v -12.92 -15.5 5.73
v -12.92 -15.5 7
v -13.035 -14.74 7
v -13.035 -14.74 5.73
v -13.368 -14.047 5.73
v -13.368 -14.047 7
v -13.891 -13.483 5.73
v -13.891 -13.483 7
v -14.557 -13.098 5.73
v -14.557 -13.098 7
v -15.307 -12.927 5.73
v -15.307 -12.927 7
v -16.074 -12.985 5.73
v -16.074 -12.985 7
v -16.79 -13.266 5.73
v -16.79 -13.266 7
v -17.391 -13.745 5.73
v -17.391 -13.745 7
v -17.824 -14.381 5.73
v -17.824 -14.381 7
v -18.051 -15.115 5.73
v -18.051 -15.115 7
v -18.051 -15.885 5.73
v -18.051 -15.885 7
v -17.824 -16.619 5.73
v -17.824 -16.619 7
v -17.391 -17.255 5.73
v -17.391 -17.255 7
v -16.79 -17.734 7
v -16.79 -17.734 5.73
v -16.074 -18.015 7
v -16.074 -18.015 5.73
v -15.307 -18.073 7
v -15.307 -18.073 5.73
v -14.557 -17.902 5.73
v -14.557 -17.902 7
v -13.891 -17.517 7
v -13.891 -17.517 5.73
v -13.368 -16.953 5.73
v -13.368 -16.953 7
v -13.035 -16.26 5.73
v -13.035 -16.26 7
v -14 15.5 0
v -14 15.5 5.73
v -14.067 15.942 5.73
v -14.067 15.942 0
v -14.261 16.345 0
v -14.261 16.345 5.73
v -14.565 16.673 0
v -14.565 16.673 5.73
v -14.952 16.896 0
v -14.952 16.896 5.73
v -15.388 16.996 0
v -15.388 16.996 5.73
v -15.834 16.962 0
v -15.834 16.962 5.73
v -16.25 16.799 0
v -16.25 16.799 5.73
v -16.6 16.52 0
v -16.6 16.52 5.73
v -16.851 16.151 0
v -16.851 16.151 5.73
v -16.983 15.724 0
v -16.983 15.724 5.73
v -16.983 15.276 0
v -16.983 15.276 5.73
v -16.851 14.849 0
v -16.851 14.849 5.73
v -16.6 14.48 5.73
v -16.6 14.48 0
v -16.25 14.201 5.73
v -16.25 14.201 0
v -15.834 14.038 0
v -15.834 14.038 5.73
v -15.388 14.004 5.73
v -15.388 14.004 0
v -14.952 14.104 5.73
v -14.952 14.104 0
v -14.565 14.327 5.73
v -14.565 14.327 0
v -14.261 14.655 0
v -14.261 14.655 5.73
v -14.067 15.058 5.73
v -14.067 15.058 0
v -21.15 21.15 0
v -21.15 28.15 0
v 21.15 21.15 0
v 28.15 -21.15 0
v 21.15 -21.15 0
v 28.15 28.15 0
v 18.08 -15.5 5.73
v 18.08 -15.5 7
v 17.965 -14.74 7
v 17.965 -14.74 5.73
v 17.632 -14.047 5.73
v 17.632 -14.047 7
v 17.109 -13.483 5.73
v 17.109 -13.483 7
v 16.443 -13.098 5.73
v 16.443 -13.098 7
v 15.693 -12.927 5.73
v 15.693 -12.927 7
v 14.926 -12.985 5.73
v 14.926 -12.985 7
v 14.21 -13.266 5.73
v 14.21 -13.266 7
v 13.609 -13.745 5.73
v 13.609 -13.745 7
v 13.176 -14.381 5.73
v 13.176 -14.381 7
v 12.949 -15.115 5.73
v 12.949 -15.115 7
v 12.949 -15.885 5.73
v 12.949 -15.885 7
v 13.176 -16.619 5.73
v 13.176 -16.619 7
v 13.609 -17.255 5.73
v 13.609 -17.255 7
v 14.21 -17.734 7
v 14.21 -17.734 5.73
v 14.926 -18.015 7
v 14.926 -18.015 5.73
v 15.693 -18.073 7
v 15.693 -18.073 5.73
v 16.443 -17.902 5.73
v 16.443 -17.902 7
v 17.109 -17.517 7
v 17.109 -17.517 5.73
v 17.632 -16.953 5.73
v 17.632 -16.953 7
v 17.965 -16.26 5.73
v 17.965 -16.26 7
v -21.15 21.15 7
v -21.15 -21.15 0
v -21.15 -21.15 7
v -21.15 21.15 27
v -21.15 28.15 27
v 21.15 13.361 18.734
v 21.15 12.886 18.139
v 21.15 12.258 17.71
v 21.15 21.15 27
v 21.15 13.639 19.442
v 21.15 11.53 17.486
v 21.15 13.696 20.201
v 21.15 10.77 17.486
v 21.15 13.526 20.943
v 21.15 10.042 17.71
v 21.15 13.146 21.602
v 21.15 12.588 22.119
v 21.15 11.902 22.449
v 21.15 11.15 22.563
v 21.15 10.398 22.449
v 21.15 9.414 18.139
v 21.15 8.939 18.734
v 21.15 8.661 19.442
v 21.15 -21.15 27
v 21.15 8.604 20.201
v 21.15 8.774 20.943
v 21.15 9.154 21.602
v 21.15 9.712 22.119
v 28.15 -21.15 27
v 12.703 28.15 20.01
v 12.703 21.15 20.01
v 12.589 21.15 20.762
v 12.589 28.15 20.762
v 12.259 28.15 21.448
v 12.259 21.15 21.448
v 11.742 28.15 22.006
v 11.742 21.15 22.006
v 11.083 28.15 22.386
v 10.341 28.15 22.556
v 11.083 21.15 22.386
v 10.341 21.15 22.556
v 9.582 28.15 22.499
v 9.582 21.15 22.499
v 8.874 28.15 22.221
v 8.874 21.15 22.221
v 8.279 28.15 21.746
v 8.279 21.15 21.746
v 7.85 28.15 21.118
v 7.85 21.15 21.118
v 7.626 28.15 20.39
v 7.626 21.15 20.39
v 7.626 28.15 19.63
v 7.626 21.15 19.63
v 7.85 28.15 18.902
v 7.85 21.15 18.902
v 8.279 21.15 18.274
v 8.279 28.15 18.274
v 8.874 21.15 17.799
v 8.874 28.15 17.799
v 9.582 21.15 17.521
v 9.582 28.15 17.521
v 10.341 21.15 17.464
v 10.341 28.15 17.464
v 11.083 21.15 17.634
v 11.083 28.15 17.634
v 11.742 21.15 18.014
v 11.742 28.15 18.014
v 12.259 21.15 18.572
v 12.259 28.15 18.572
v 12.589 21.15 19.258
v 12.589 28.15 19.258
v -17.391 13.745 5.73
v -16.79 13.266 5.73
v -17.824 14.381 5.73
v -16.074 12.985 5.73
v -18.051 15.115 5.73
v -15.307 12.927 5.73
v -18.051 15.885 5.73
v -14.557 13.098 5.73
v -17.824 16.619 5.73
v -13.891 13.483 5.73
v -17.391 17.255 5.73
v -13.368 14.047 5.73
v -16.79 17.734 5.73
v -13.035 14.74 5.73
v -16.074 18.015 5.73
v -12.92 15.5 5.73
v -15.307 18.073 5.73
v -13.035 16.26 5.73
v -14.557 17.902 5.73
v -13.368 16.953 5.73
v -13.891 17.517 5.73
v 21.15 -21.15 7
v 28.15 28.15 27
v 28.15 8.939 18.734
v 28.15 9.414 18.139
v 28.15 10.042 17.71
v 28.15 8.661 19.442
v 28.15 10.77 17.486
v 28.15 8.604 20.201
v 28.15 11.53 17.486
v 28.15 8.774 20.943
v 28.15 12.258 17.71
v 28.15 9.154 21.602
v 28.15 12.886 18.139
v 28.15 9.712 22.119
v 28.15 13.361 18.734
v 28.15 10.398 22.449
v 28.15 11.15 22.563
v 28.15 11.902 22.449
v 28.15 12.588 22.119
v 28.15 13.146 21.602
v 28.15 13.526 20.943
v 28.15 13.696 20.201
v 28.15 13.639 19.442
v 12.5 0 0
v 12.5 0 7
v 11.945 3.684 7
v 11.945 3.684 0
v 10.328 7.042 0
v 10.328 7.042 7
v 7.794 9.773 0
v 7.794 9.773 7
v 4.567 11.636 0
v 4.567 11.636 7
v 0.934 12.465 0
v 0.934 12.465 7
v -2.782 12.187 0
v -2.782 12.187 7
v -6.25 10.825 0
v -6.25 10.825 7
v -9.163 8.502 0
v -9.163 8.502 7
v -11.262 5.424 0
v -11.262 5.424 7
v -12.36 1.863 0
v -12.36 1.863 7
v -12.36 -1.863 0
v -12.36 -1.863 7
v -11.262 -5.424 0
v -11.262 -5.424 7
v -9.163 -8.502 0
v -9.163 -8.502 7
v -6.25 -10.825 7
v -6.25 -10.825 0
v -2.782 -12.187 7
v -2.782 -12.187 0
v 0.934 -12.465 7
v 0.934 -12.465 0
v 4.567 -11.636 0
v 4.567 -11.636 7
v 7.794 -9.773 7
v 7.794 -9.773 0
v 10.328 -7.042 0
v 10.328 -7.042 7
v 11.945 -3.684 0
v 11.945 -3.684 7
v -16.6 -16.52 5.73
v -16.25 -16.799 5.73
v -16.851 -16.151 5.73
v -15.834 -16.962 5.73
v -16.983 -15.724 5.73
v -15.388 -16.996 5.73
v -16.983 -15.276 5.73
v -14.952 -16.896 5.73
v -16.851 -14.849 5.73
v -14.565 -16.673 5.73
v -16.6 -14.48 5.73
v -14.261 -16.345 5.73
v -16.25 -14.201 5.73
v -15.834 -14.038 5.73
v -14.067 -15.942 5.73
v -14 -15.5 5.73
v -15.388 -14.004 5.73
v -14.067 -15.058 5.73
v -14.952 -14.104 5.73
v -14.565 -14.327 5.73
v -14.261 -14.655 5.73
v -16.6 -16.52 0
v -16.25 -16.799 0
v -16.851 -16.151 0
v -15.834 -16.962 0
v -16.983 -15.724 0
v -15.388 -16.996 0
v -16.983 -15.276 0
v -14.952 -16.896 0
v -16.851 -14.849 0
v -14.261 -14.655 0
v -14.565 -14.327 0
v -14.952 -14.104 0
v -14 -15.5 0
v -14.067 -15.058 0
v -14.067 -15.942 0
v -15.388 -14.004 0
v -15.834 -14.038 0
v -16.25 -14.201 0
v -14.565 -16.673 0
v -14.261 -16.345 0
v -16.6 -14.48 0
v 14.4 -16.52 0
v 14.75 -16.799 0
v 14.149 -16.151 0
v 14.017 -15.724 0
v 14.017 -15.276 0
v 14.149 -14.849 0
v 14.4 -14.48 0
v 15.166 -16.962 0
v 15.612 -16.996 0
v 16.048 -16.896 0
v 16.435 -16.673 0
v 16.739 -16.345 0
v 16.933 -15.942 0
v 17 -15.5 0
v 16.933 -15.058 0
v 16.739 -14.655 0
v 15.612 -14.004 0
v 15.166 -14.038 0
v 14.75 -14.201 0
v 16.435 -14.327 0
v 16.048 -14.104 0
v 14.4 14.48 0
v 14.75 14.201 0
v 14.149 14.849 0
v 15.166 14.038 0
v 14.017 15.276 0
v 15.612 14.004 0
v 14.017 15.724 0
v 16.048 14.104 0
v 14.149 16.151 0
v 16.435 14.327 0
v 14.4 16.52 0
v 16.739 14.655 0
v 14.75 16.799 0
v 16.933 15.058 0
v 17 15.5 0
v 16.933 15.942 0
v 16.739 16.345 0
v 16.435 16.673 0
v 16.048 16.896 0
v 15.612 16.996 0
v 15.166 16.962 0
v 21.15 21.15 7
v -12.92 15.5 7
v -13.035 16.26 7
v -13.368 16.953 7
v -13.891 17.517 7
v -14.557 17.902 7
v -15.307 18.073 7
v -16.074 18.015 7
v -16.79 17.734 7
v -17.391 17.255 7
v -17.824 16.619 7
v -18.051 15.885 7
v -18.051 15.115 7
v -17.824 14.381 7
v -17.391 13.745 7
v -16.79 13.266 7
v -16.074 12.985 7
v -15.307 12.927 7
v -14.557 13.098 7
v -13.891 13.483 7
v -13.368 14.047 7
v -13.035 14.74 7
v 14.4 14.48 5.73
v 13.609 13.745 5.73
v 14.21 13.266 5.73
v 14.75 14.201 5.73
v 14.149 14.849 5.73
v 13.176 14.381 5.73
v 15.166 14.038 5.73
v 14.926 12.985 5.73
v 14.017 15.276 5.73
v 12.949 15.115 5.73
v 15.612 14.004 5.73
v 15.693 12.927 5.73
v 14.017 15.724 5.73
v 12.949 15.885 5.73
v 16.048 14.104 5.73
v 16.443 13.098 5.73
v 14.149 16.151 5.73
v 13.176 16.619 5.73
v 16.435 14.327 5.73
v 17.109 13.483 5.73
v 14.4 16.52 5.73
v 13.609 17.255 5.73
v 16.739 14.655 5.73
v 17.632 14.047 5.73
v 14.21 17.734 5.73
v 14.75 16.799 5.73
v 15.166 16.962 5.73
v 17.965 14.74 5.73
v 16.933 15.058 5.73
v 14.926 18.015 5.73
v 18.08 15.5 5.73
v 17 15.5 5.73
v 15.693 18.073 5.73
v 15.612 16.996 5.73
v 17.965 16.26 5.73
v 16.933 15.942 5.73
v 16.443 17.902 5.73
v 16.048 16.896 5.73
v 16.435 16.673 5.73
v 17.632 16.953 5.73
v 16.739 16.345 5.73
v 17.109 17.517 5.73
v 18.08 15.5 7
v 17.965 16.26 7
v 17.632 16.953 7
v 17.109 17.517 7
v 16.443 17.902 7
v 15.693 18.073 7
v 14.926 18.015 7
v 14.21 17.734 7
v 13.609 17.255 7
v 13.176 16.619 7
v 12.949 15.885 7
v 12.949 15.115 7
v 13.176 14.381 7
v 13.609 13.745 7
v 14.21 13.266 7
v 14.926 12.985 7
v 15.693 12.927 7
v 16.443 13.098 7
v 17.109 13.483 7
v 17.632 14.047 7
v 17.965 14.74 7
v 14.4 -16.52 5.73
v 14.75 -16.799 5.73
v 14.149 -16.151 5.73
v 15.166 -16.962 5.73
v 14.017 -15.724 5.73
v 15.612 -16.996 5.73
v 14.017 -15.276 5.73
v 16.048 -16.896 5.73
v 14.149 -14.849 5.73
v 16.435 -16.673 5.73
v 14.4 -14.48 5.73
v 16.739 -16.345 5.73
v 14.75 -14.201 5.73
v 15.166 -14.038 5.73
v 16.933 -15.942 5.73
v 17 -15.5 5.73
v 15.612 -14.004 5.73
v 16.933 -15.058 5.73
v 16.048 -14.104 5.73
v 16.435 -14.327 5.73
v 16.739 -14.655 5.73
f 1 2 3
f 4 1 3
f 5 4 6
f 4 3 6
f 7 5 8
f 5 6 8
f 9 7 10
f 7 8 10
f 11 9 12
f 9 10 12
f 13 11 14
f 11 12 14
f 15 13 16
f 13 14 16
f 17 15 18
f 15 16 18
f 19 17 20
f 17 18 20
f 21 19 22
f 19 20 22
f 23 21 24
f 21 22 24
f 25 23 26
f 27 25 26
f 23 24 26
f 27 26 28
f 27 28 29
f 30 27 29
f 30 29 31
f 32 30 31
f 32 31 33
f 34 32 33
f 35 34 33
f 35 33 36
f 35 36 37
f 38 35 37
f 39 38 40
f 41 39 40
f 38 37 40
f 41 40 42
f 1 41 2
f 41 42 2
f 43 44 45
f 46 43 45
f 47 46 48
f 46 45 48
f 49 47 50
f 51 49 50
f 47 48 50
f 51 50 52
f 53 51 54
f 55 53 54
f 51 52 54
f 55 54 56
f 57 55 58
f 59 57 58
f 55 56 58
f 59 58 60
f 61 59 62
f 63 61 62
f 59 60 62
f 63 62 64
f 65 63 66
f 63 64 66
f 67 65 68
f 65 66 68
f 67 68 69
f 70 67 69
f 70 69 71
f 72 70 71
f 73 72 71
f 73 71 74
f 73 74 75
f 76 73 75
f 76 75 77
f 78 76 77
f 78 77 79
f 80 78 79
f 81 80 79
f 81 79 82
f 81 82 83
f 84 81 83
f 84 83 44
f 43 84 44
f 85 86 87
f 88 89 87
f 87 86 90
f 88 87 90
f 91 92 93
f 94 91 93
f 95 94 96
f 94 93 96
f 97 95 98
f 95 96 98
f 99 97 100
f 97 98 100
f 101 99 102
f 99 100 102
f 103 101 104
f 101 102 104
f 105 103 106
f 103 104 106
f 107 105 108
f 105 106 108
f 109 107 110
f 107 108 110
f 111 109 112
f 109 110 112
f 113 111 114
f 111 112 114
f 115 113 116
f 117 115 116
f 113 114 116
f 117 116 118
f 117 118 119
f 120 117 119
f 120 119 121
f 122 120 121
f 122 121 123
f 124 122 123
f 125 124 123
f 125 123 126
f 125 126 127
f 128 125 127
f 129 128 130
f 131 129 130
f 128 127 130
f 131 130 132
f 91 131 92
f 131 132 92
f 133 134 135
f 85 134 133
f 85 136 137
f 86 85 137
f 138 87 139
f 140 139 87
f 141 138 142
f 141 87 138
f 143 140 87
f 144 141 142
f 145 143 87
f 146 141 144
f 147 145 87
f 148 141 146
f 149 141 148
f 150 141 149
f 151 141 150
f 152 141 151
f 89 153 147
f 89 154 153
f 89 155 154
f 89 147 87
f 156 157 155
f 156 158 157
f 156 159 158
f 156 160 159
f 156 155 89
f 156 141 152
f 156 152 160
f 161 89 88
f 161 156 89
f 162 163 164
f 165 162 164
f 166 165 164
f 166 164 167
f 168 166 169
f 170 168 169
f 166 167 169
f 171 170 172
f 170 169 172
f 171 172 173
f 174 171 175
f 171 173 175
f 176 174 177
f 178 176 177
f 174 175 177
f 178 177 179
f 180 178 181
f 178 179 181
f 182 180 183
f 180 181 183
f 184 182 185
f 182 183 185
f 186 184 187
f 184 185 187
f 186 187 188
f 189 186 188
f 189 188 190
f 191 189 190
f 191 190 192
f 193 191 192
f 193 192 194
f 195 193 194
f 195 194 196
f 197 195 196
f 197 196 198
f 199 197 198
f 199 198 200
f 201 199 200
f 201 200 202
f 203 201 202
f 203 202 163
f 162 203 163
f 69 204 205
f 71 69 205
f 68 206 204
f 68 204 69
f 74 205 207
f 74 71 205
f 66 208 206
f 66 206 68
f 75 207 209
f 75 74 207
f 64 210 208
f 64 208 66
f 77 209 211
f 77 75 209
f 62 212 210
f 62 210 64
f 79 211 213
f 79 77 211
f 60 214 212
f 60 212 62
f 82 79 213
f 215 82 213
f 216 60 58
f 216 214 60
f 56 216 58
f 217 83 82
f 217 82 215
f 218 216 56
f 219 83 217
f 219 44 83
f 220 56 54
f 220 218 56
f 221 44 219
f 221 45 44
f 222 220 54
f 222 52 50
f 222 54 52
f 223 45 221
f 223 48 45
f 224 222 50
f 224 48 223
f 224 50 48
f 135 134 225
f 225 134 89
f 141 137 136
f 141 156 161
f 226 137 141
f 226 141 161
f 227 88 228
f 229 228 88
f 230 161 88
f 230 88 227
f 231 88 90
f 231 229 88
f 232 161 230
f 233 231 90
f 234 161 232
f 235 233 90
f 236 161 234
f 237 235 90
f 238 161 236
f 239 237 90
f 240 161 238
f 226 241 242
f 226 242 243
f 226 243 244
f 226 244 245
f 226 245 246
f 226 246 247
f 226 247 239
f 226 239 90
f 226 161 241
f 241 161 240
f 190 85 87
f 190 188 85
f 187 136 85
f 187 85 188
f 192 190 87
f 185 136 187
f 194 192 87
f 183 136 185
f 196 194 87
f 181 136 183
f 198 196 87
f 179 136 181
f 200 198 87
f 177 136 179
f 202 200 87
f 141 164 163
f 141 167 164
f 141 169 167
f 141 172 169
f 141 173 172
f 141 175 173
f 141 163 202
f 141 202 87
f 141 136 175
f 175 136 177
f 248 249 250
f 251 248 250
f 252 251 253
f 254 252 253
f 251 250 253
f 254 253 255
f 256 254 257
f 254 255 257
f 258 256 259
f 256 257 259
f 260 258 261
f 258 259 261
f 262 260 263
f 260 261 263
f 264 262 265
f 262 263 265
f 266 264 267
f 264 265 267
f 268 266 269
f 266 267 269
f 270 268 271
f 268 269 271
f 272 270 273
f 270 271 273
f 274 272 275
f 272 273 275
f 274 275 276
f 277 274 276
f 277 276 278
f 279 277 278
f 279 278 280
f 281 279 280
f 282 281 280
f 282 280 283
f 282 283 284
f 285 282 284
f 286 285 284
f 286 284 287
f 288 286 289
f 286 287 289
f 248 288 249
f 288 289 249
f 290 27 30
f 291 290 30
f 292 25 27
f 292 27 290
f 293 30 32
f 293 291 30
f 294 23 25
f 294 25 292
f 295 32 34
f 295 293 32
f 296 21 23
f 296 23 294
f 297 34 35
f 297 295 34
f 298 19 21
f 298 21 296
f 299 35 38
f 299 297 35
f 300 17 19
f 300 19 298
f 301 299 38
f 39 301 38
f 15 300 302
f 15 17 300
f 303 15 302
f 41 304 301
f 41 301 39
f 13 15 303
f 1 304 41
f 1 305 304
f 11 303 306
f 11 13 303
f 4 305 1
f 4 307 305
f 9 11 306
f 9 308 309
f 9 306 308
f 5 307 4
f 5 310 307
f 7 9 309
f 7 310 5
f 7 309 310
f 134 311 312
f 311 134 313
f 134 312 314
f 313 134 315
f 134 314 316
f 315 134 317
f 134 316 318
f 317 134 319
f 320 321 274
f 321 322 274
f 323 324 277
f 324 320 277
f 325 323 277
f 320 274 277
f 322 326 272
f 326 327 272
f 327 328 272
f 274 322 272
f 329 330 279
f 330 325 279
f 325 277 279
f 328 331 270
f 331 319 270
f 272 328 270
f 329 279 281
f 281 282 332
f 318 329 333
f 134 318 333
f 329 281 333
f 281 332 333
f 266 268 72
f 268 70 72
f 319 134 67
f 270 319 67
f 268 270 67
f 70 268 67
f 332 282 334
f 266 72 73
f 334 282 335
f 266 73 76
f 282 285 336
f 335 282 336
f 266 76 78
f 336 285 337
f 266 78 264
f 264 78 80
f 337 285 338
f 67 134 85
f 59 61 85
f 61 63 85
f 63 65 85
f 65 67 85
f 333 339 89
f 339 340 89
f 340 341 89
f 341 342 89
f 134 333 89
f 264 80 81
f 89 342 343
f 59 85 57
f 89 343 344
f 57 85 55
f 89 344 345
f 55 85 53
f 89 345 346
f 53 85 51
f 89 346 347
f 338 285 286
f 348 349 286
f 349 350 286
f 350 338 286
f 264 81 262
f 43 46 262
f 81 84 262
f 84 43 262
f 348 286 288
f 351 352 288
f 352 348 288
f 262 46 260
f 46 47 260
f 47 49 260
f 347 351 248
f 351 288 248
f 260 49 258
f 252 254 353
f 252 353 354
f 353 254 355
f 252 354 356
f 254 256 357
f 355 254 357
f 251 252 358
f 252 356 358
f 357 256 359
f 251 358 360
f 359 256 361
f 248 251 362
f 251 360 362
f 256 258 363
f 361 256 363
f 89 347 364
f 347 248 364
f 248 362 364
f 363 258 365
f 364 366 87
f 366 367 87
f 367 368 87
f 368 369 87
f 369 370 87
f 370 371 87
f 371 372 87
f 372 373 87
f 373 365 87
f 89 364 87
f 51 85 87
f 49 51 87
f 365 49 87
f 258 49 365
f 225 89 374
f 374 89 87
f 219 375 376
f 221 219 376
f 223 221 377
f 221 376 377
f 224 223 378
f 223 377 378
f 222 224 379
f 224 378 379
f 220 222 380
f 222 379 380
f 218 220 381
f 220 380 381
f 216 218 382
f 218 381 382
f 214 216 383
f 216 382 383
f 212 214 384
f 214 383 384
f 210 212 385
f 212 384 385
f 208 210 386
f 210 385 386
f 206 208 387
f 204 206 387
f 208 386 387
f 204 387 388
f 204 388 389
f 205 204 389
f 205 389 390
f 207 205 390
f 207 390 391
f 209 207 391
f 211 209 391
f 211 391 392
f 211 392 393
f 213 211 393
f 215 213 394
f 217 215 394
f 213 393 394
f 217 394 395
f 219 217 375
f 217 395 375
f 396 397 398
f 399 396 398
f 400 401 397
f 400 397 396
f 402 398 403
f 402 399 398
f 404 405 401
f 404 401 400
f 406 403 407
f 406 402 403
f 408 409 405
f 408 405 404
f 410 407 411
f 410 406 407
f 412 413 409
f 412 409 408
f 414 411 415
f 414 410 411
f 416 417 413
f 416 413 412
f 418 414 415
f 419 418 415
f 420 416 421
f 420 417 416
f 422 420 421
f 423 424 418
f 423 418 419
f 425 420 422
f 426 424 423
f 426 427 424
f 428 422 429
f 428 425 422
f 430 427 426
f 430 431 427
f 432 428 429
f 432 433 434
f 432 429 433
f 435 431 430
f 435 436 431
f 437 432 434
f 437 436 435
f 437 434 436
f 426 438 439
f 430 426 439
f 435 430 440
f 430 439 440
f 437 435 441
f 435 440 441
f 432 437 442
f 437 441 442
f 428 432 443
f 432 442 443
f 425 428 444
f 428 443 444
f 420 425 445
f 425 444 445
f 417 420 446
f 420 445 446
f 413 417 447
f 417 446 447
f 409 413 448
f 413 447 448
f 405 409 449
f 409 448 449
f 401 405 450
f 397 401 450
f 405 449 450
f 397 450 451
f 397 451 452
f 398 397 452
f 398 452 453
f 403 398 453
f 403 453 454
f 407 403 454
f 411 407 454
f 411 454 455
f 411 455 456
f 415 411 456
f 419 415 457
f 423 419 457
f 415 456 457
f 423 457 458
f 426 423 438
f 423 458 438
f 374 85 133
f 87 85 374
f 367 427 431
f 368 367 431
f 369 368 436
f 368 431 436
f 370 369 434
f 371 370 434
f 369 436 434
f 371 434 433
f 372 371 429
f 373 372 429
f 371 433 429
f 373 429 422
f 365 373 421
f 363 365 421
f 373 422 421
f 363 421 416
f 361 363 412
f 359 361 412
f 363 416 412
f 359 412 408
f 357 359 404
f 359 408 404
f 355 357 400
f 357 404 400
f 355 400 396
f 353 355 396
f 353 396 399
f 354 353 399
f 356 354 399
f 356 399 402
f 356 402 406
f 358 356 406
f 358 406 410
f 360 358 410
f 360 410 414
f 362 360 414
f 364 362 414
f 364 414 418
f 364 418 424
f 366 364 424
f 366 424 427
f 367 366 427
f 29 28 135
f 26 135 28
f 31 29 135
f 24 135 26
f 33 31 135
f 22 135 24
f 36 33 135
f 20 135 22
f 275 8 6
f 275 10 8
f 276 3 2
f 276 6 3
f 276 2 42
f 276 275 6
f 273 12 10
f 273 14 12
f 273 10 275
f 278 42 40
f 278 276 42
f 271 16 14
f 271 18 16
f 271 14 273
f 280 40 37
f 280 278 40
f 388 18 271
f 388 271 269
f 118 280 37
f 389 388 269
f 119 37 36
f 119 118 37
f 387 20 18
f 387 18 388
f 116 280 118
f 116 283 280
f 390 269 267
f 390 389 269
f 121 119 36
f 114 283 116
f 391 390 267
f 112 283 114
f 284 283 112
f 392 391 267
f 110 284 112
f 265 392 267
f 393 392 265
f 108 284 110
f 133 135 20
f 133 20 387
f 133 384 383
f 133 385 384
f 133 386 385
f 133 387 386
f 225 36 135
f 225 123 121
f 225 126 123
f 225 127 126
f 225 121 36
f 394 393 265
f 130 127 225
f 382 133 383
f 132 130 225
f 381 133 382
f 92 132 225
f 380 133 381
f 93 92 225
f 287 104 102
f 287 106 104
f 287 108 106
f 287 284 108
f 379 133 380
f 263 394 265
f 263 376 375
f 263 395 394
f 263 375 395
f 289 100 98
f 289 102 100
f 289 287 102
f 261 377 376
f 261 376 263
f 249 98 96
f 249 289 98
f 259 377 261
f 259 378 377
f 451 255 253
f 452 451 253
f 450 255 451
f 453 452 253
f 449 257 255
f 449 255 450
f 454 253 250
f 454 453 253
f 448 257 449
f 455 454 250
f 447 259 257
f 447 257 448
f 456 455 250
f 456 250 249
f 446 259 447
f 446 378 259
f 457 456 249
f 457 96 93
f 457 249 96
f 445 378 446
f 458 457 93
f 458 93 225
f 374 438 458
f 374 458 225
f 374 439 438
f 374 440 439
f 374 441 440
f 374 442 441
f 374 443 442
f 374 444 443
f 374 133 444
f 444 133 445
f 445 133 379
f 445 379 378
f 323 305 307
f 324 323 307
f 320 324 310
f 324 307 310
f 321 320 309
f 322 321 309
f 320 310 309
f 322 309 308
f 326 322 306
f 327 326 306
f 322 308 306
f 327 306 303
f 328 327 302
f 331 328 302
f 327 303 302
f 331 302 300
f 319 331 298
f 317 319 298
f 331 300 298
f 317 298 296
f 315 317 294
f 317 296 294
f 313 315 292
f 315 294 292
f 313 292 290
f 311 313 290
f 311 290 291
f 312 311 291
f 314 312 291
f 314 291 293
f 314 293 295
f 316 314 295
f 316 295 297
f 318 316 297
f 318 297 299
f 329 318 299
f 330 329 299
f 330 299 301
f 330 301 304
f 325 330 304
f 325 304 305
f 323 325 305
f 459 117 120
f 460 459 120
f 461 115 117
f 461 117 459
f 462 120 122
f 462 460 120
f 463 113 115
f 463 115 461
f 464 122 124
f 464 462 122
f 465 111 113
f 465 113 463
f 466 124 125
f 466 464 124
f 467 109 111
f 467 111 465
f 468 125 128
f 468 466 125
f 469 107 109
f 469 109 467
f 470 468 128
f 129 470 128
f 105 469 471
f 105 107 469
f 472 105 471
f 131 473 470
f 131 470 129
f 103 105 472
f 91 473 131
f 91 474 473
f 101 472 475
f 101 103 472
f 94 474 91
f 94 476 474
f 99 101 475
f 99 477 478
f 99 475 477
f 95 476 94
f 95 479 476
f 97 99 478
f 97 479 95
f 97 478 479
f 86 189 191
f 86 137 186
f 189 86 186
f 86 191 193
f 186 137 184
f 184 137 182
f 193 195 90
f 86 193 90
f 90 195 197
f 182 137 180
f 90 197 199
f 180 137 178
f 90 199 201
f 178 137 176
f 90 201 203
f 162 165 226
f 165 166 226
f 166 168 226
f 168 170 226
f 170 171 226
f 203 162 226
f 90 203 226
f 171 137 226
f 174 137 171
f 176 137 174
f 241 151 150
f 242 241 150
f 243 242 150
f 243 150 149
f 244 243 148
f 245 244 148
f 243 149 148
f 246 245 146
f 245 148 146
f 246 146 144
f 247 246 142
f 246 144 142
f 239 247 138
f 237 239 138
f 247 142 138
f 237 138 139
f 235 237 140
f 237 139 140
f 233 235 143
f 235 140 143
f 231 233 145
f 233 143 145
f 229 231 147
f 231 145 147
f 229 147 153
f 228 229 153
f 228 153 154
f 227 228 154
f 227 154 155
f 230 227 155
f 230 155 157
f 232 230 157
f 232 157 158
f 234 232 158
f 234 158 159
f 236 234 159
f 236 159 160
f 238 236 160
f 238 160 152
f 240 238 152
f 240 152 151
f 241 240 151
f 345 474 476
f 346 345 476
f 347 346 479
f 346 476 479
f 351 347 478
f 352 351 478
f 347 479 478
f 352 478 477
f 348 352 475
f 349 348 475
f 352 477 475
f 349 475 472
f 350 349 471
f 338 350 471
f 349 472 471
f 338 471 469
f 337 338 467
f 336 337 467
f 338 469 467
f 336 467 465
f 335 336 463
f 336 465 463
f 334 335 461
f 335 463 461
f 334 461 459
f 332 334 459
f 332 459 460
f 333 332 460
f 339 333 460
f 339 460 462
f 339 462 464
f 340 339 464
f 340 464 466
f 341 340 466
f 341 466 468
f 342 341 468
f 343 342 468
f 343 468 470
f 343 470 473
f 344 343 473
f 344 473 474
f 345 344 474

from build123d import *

# Parameters (mm, degrees)
SKETCH1_W                = 42.3
SKETCH1_H                = 42.3
BOSS_EXTRUDE1_DEPTH      = 7
SKETCH2_R                = 1.5
SKETCH2_R_2              = 12.5
CUT_EXTRUDE1_DEPTH       = 7
BOSS_EXTRUDE2_DEPTH      = 20
BOSS_EXTRUDE2_DEPTH_BACK = 7
SKETCH4_R                = 2.58
CUT_EXTRUDE2_DEPTH       = 1.27
SKETCH5_W                = 42.3
SKETCH5_H                = 7
BOSS_EXTRUDE3_DEPTH      = 20
BOSS_EXTRUDE3_DEPTH_BACK = 7
SKETCH6_R                = 2.5527
CUT_EXTRUDE3_DEPTH       = 8
SKETCH7_R                = 2.5527
CUT_EXTRUDE4_DEPTH       = 8


with BuildPart() as part:
    # Sketch1 → Boss-Extrude1 (new body)
    with BuildSketch(Plane.XY):
        Rectangle(SKETCH1_W, SKETCH1_H)
    extrude(amount=BOSS_EXTRUDE1_DEPTH)

    # Sketch2 → Cut-Extrude1 (cut)
    with BuildSketch(Plane.XY.offset(7)):
        with Locations((-15.5, 15.5)):
            Circle(SKETCH2_R)
        Circle(SKETCH2_R_2)
        with Locations((15.5, 15.5)):
            Circle(SKETCH2_R)
        with Locations((15.5, -15.5)):
            Circle(SKETCH2_R)
        with Locations((-15.5, -15.5)):
            Circle(SKETCH2_R)
    extrude(amount=-CUT_EXTRUDE1_DEPTH, mode=Mode.SUBTRACT)

    # Sketch4 → Cut-Extrude2 (cut)
    with BuildSketch(Plane.XY.offset(7)):
        with Locations((-15.5, 15.5)):
            Circle(SKETCH4_R)
        with Locations((15.5, 15.5)):
            Circle(SKETCH4_R)
        with Locations((-15.5, -15.5)):
            Circle(SKETCH4_R)
        with Locations((15.5, -15.5)):
            Circle(SKETCH4_R)
    extrude(amount=-CUT_EXTRUDE2_DEPTH, mode=Mode.SUBTRACT)


with BuildPart() as body_2:
    # Sketch3 → Boss-Extrude2 (new body, two sides)
    with BuildSketch(Plane.XY.offset(7)) as boss_extrude2_sk:
        Polygon((21.15, 21.15), (21.15, -21.15), (28.15, -21.15), (28.15, 21.15), (28.15, 28.15), (21.15, 28.15), align=None)
    extrude(amount=BOSS_EXTRUDE2_DEPTH)
    extrude(boss_extrude2_sk.sketch, amount=-BOSS_EXTRUDE2_DEPTH_BACK)

    # Sketch5 → Boss-Extrude3 (add, two sides)
    with BuildSketch(Plane.XY.offset(7)) as boss_extrude3_sk:
        with Locations((0, 24.65)):
            Rectangle(SKETCH5_W, SKETCH5_H)
    extrude(amount=BOSS_EXTRUDE3_DEPTH)
    extrude(boss_extrude3_sk.sketch, amount=-BOSS_EXTRUDE3_DEPTH_BACK)

    # Sketch6 → Cut-Extrude3 (cut, through all)
    with BuildSketch(Plane.XZ.offset(-21.15)):
        with Locations((10.15, 20.01)):
            Circle(SKETCH6_R)
    extrude(amount=-CUT_EXTRUDE3_DEPTH, mode=Mode.SUBTRACT)

    # Sketch7 → Cut-Extrude4 (cut, through all)
    with BuildSketch(Plane.ZY.offset(-21.15)):
        with Locations((20.01, 11.15)):
            Circle(SKETCH7_R)
    extrude(amount=-CUT_EXTRUDE4_DEPTH, mode=Mode.SUBTRACT)


solid = Compound([part.part, body_2.part])
